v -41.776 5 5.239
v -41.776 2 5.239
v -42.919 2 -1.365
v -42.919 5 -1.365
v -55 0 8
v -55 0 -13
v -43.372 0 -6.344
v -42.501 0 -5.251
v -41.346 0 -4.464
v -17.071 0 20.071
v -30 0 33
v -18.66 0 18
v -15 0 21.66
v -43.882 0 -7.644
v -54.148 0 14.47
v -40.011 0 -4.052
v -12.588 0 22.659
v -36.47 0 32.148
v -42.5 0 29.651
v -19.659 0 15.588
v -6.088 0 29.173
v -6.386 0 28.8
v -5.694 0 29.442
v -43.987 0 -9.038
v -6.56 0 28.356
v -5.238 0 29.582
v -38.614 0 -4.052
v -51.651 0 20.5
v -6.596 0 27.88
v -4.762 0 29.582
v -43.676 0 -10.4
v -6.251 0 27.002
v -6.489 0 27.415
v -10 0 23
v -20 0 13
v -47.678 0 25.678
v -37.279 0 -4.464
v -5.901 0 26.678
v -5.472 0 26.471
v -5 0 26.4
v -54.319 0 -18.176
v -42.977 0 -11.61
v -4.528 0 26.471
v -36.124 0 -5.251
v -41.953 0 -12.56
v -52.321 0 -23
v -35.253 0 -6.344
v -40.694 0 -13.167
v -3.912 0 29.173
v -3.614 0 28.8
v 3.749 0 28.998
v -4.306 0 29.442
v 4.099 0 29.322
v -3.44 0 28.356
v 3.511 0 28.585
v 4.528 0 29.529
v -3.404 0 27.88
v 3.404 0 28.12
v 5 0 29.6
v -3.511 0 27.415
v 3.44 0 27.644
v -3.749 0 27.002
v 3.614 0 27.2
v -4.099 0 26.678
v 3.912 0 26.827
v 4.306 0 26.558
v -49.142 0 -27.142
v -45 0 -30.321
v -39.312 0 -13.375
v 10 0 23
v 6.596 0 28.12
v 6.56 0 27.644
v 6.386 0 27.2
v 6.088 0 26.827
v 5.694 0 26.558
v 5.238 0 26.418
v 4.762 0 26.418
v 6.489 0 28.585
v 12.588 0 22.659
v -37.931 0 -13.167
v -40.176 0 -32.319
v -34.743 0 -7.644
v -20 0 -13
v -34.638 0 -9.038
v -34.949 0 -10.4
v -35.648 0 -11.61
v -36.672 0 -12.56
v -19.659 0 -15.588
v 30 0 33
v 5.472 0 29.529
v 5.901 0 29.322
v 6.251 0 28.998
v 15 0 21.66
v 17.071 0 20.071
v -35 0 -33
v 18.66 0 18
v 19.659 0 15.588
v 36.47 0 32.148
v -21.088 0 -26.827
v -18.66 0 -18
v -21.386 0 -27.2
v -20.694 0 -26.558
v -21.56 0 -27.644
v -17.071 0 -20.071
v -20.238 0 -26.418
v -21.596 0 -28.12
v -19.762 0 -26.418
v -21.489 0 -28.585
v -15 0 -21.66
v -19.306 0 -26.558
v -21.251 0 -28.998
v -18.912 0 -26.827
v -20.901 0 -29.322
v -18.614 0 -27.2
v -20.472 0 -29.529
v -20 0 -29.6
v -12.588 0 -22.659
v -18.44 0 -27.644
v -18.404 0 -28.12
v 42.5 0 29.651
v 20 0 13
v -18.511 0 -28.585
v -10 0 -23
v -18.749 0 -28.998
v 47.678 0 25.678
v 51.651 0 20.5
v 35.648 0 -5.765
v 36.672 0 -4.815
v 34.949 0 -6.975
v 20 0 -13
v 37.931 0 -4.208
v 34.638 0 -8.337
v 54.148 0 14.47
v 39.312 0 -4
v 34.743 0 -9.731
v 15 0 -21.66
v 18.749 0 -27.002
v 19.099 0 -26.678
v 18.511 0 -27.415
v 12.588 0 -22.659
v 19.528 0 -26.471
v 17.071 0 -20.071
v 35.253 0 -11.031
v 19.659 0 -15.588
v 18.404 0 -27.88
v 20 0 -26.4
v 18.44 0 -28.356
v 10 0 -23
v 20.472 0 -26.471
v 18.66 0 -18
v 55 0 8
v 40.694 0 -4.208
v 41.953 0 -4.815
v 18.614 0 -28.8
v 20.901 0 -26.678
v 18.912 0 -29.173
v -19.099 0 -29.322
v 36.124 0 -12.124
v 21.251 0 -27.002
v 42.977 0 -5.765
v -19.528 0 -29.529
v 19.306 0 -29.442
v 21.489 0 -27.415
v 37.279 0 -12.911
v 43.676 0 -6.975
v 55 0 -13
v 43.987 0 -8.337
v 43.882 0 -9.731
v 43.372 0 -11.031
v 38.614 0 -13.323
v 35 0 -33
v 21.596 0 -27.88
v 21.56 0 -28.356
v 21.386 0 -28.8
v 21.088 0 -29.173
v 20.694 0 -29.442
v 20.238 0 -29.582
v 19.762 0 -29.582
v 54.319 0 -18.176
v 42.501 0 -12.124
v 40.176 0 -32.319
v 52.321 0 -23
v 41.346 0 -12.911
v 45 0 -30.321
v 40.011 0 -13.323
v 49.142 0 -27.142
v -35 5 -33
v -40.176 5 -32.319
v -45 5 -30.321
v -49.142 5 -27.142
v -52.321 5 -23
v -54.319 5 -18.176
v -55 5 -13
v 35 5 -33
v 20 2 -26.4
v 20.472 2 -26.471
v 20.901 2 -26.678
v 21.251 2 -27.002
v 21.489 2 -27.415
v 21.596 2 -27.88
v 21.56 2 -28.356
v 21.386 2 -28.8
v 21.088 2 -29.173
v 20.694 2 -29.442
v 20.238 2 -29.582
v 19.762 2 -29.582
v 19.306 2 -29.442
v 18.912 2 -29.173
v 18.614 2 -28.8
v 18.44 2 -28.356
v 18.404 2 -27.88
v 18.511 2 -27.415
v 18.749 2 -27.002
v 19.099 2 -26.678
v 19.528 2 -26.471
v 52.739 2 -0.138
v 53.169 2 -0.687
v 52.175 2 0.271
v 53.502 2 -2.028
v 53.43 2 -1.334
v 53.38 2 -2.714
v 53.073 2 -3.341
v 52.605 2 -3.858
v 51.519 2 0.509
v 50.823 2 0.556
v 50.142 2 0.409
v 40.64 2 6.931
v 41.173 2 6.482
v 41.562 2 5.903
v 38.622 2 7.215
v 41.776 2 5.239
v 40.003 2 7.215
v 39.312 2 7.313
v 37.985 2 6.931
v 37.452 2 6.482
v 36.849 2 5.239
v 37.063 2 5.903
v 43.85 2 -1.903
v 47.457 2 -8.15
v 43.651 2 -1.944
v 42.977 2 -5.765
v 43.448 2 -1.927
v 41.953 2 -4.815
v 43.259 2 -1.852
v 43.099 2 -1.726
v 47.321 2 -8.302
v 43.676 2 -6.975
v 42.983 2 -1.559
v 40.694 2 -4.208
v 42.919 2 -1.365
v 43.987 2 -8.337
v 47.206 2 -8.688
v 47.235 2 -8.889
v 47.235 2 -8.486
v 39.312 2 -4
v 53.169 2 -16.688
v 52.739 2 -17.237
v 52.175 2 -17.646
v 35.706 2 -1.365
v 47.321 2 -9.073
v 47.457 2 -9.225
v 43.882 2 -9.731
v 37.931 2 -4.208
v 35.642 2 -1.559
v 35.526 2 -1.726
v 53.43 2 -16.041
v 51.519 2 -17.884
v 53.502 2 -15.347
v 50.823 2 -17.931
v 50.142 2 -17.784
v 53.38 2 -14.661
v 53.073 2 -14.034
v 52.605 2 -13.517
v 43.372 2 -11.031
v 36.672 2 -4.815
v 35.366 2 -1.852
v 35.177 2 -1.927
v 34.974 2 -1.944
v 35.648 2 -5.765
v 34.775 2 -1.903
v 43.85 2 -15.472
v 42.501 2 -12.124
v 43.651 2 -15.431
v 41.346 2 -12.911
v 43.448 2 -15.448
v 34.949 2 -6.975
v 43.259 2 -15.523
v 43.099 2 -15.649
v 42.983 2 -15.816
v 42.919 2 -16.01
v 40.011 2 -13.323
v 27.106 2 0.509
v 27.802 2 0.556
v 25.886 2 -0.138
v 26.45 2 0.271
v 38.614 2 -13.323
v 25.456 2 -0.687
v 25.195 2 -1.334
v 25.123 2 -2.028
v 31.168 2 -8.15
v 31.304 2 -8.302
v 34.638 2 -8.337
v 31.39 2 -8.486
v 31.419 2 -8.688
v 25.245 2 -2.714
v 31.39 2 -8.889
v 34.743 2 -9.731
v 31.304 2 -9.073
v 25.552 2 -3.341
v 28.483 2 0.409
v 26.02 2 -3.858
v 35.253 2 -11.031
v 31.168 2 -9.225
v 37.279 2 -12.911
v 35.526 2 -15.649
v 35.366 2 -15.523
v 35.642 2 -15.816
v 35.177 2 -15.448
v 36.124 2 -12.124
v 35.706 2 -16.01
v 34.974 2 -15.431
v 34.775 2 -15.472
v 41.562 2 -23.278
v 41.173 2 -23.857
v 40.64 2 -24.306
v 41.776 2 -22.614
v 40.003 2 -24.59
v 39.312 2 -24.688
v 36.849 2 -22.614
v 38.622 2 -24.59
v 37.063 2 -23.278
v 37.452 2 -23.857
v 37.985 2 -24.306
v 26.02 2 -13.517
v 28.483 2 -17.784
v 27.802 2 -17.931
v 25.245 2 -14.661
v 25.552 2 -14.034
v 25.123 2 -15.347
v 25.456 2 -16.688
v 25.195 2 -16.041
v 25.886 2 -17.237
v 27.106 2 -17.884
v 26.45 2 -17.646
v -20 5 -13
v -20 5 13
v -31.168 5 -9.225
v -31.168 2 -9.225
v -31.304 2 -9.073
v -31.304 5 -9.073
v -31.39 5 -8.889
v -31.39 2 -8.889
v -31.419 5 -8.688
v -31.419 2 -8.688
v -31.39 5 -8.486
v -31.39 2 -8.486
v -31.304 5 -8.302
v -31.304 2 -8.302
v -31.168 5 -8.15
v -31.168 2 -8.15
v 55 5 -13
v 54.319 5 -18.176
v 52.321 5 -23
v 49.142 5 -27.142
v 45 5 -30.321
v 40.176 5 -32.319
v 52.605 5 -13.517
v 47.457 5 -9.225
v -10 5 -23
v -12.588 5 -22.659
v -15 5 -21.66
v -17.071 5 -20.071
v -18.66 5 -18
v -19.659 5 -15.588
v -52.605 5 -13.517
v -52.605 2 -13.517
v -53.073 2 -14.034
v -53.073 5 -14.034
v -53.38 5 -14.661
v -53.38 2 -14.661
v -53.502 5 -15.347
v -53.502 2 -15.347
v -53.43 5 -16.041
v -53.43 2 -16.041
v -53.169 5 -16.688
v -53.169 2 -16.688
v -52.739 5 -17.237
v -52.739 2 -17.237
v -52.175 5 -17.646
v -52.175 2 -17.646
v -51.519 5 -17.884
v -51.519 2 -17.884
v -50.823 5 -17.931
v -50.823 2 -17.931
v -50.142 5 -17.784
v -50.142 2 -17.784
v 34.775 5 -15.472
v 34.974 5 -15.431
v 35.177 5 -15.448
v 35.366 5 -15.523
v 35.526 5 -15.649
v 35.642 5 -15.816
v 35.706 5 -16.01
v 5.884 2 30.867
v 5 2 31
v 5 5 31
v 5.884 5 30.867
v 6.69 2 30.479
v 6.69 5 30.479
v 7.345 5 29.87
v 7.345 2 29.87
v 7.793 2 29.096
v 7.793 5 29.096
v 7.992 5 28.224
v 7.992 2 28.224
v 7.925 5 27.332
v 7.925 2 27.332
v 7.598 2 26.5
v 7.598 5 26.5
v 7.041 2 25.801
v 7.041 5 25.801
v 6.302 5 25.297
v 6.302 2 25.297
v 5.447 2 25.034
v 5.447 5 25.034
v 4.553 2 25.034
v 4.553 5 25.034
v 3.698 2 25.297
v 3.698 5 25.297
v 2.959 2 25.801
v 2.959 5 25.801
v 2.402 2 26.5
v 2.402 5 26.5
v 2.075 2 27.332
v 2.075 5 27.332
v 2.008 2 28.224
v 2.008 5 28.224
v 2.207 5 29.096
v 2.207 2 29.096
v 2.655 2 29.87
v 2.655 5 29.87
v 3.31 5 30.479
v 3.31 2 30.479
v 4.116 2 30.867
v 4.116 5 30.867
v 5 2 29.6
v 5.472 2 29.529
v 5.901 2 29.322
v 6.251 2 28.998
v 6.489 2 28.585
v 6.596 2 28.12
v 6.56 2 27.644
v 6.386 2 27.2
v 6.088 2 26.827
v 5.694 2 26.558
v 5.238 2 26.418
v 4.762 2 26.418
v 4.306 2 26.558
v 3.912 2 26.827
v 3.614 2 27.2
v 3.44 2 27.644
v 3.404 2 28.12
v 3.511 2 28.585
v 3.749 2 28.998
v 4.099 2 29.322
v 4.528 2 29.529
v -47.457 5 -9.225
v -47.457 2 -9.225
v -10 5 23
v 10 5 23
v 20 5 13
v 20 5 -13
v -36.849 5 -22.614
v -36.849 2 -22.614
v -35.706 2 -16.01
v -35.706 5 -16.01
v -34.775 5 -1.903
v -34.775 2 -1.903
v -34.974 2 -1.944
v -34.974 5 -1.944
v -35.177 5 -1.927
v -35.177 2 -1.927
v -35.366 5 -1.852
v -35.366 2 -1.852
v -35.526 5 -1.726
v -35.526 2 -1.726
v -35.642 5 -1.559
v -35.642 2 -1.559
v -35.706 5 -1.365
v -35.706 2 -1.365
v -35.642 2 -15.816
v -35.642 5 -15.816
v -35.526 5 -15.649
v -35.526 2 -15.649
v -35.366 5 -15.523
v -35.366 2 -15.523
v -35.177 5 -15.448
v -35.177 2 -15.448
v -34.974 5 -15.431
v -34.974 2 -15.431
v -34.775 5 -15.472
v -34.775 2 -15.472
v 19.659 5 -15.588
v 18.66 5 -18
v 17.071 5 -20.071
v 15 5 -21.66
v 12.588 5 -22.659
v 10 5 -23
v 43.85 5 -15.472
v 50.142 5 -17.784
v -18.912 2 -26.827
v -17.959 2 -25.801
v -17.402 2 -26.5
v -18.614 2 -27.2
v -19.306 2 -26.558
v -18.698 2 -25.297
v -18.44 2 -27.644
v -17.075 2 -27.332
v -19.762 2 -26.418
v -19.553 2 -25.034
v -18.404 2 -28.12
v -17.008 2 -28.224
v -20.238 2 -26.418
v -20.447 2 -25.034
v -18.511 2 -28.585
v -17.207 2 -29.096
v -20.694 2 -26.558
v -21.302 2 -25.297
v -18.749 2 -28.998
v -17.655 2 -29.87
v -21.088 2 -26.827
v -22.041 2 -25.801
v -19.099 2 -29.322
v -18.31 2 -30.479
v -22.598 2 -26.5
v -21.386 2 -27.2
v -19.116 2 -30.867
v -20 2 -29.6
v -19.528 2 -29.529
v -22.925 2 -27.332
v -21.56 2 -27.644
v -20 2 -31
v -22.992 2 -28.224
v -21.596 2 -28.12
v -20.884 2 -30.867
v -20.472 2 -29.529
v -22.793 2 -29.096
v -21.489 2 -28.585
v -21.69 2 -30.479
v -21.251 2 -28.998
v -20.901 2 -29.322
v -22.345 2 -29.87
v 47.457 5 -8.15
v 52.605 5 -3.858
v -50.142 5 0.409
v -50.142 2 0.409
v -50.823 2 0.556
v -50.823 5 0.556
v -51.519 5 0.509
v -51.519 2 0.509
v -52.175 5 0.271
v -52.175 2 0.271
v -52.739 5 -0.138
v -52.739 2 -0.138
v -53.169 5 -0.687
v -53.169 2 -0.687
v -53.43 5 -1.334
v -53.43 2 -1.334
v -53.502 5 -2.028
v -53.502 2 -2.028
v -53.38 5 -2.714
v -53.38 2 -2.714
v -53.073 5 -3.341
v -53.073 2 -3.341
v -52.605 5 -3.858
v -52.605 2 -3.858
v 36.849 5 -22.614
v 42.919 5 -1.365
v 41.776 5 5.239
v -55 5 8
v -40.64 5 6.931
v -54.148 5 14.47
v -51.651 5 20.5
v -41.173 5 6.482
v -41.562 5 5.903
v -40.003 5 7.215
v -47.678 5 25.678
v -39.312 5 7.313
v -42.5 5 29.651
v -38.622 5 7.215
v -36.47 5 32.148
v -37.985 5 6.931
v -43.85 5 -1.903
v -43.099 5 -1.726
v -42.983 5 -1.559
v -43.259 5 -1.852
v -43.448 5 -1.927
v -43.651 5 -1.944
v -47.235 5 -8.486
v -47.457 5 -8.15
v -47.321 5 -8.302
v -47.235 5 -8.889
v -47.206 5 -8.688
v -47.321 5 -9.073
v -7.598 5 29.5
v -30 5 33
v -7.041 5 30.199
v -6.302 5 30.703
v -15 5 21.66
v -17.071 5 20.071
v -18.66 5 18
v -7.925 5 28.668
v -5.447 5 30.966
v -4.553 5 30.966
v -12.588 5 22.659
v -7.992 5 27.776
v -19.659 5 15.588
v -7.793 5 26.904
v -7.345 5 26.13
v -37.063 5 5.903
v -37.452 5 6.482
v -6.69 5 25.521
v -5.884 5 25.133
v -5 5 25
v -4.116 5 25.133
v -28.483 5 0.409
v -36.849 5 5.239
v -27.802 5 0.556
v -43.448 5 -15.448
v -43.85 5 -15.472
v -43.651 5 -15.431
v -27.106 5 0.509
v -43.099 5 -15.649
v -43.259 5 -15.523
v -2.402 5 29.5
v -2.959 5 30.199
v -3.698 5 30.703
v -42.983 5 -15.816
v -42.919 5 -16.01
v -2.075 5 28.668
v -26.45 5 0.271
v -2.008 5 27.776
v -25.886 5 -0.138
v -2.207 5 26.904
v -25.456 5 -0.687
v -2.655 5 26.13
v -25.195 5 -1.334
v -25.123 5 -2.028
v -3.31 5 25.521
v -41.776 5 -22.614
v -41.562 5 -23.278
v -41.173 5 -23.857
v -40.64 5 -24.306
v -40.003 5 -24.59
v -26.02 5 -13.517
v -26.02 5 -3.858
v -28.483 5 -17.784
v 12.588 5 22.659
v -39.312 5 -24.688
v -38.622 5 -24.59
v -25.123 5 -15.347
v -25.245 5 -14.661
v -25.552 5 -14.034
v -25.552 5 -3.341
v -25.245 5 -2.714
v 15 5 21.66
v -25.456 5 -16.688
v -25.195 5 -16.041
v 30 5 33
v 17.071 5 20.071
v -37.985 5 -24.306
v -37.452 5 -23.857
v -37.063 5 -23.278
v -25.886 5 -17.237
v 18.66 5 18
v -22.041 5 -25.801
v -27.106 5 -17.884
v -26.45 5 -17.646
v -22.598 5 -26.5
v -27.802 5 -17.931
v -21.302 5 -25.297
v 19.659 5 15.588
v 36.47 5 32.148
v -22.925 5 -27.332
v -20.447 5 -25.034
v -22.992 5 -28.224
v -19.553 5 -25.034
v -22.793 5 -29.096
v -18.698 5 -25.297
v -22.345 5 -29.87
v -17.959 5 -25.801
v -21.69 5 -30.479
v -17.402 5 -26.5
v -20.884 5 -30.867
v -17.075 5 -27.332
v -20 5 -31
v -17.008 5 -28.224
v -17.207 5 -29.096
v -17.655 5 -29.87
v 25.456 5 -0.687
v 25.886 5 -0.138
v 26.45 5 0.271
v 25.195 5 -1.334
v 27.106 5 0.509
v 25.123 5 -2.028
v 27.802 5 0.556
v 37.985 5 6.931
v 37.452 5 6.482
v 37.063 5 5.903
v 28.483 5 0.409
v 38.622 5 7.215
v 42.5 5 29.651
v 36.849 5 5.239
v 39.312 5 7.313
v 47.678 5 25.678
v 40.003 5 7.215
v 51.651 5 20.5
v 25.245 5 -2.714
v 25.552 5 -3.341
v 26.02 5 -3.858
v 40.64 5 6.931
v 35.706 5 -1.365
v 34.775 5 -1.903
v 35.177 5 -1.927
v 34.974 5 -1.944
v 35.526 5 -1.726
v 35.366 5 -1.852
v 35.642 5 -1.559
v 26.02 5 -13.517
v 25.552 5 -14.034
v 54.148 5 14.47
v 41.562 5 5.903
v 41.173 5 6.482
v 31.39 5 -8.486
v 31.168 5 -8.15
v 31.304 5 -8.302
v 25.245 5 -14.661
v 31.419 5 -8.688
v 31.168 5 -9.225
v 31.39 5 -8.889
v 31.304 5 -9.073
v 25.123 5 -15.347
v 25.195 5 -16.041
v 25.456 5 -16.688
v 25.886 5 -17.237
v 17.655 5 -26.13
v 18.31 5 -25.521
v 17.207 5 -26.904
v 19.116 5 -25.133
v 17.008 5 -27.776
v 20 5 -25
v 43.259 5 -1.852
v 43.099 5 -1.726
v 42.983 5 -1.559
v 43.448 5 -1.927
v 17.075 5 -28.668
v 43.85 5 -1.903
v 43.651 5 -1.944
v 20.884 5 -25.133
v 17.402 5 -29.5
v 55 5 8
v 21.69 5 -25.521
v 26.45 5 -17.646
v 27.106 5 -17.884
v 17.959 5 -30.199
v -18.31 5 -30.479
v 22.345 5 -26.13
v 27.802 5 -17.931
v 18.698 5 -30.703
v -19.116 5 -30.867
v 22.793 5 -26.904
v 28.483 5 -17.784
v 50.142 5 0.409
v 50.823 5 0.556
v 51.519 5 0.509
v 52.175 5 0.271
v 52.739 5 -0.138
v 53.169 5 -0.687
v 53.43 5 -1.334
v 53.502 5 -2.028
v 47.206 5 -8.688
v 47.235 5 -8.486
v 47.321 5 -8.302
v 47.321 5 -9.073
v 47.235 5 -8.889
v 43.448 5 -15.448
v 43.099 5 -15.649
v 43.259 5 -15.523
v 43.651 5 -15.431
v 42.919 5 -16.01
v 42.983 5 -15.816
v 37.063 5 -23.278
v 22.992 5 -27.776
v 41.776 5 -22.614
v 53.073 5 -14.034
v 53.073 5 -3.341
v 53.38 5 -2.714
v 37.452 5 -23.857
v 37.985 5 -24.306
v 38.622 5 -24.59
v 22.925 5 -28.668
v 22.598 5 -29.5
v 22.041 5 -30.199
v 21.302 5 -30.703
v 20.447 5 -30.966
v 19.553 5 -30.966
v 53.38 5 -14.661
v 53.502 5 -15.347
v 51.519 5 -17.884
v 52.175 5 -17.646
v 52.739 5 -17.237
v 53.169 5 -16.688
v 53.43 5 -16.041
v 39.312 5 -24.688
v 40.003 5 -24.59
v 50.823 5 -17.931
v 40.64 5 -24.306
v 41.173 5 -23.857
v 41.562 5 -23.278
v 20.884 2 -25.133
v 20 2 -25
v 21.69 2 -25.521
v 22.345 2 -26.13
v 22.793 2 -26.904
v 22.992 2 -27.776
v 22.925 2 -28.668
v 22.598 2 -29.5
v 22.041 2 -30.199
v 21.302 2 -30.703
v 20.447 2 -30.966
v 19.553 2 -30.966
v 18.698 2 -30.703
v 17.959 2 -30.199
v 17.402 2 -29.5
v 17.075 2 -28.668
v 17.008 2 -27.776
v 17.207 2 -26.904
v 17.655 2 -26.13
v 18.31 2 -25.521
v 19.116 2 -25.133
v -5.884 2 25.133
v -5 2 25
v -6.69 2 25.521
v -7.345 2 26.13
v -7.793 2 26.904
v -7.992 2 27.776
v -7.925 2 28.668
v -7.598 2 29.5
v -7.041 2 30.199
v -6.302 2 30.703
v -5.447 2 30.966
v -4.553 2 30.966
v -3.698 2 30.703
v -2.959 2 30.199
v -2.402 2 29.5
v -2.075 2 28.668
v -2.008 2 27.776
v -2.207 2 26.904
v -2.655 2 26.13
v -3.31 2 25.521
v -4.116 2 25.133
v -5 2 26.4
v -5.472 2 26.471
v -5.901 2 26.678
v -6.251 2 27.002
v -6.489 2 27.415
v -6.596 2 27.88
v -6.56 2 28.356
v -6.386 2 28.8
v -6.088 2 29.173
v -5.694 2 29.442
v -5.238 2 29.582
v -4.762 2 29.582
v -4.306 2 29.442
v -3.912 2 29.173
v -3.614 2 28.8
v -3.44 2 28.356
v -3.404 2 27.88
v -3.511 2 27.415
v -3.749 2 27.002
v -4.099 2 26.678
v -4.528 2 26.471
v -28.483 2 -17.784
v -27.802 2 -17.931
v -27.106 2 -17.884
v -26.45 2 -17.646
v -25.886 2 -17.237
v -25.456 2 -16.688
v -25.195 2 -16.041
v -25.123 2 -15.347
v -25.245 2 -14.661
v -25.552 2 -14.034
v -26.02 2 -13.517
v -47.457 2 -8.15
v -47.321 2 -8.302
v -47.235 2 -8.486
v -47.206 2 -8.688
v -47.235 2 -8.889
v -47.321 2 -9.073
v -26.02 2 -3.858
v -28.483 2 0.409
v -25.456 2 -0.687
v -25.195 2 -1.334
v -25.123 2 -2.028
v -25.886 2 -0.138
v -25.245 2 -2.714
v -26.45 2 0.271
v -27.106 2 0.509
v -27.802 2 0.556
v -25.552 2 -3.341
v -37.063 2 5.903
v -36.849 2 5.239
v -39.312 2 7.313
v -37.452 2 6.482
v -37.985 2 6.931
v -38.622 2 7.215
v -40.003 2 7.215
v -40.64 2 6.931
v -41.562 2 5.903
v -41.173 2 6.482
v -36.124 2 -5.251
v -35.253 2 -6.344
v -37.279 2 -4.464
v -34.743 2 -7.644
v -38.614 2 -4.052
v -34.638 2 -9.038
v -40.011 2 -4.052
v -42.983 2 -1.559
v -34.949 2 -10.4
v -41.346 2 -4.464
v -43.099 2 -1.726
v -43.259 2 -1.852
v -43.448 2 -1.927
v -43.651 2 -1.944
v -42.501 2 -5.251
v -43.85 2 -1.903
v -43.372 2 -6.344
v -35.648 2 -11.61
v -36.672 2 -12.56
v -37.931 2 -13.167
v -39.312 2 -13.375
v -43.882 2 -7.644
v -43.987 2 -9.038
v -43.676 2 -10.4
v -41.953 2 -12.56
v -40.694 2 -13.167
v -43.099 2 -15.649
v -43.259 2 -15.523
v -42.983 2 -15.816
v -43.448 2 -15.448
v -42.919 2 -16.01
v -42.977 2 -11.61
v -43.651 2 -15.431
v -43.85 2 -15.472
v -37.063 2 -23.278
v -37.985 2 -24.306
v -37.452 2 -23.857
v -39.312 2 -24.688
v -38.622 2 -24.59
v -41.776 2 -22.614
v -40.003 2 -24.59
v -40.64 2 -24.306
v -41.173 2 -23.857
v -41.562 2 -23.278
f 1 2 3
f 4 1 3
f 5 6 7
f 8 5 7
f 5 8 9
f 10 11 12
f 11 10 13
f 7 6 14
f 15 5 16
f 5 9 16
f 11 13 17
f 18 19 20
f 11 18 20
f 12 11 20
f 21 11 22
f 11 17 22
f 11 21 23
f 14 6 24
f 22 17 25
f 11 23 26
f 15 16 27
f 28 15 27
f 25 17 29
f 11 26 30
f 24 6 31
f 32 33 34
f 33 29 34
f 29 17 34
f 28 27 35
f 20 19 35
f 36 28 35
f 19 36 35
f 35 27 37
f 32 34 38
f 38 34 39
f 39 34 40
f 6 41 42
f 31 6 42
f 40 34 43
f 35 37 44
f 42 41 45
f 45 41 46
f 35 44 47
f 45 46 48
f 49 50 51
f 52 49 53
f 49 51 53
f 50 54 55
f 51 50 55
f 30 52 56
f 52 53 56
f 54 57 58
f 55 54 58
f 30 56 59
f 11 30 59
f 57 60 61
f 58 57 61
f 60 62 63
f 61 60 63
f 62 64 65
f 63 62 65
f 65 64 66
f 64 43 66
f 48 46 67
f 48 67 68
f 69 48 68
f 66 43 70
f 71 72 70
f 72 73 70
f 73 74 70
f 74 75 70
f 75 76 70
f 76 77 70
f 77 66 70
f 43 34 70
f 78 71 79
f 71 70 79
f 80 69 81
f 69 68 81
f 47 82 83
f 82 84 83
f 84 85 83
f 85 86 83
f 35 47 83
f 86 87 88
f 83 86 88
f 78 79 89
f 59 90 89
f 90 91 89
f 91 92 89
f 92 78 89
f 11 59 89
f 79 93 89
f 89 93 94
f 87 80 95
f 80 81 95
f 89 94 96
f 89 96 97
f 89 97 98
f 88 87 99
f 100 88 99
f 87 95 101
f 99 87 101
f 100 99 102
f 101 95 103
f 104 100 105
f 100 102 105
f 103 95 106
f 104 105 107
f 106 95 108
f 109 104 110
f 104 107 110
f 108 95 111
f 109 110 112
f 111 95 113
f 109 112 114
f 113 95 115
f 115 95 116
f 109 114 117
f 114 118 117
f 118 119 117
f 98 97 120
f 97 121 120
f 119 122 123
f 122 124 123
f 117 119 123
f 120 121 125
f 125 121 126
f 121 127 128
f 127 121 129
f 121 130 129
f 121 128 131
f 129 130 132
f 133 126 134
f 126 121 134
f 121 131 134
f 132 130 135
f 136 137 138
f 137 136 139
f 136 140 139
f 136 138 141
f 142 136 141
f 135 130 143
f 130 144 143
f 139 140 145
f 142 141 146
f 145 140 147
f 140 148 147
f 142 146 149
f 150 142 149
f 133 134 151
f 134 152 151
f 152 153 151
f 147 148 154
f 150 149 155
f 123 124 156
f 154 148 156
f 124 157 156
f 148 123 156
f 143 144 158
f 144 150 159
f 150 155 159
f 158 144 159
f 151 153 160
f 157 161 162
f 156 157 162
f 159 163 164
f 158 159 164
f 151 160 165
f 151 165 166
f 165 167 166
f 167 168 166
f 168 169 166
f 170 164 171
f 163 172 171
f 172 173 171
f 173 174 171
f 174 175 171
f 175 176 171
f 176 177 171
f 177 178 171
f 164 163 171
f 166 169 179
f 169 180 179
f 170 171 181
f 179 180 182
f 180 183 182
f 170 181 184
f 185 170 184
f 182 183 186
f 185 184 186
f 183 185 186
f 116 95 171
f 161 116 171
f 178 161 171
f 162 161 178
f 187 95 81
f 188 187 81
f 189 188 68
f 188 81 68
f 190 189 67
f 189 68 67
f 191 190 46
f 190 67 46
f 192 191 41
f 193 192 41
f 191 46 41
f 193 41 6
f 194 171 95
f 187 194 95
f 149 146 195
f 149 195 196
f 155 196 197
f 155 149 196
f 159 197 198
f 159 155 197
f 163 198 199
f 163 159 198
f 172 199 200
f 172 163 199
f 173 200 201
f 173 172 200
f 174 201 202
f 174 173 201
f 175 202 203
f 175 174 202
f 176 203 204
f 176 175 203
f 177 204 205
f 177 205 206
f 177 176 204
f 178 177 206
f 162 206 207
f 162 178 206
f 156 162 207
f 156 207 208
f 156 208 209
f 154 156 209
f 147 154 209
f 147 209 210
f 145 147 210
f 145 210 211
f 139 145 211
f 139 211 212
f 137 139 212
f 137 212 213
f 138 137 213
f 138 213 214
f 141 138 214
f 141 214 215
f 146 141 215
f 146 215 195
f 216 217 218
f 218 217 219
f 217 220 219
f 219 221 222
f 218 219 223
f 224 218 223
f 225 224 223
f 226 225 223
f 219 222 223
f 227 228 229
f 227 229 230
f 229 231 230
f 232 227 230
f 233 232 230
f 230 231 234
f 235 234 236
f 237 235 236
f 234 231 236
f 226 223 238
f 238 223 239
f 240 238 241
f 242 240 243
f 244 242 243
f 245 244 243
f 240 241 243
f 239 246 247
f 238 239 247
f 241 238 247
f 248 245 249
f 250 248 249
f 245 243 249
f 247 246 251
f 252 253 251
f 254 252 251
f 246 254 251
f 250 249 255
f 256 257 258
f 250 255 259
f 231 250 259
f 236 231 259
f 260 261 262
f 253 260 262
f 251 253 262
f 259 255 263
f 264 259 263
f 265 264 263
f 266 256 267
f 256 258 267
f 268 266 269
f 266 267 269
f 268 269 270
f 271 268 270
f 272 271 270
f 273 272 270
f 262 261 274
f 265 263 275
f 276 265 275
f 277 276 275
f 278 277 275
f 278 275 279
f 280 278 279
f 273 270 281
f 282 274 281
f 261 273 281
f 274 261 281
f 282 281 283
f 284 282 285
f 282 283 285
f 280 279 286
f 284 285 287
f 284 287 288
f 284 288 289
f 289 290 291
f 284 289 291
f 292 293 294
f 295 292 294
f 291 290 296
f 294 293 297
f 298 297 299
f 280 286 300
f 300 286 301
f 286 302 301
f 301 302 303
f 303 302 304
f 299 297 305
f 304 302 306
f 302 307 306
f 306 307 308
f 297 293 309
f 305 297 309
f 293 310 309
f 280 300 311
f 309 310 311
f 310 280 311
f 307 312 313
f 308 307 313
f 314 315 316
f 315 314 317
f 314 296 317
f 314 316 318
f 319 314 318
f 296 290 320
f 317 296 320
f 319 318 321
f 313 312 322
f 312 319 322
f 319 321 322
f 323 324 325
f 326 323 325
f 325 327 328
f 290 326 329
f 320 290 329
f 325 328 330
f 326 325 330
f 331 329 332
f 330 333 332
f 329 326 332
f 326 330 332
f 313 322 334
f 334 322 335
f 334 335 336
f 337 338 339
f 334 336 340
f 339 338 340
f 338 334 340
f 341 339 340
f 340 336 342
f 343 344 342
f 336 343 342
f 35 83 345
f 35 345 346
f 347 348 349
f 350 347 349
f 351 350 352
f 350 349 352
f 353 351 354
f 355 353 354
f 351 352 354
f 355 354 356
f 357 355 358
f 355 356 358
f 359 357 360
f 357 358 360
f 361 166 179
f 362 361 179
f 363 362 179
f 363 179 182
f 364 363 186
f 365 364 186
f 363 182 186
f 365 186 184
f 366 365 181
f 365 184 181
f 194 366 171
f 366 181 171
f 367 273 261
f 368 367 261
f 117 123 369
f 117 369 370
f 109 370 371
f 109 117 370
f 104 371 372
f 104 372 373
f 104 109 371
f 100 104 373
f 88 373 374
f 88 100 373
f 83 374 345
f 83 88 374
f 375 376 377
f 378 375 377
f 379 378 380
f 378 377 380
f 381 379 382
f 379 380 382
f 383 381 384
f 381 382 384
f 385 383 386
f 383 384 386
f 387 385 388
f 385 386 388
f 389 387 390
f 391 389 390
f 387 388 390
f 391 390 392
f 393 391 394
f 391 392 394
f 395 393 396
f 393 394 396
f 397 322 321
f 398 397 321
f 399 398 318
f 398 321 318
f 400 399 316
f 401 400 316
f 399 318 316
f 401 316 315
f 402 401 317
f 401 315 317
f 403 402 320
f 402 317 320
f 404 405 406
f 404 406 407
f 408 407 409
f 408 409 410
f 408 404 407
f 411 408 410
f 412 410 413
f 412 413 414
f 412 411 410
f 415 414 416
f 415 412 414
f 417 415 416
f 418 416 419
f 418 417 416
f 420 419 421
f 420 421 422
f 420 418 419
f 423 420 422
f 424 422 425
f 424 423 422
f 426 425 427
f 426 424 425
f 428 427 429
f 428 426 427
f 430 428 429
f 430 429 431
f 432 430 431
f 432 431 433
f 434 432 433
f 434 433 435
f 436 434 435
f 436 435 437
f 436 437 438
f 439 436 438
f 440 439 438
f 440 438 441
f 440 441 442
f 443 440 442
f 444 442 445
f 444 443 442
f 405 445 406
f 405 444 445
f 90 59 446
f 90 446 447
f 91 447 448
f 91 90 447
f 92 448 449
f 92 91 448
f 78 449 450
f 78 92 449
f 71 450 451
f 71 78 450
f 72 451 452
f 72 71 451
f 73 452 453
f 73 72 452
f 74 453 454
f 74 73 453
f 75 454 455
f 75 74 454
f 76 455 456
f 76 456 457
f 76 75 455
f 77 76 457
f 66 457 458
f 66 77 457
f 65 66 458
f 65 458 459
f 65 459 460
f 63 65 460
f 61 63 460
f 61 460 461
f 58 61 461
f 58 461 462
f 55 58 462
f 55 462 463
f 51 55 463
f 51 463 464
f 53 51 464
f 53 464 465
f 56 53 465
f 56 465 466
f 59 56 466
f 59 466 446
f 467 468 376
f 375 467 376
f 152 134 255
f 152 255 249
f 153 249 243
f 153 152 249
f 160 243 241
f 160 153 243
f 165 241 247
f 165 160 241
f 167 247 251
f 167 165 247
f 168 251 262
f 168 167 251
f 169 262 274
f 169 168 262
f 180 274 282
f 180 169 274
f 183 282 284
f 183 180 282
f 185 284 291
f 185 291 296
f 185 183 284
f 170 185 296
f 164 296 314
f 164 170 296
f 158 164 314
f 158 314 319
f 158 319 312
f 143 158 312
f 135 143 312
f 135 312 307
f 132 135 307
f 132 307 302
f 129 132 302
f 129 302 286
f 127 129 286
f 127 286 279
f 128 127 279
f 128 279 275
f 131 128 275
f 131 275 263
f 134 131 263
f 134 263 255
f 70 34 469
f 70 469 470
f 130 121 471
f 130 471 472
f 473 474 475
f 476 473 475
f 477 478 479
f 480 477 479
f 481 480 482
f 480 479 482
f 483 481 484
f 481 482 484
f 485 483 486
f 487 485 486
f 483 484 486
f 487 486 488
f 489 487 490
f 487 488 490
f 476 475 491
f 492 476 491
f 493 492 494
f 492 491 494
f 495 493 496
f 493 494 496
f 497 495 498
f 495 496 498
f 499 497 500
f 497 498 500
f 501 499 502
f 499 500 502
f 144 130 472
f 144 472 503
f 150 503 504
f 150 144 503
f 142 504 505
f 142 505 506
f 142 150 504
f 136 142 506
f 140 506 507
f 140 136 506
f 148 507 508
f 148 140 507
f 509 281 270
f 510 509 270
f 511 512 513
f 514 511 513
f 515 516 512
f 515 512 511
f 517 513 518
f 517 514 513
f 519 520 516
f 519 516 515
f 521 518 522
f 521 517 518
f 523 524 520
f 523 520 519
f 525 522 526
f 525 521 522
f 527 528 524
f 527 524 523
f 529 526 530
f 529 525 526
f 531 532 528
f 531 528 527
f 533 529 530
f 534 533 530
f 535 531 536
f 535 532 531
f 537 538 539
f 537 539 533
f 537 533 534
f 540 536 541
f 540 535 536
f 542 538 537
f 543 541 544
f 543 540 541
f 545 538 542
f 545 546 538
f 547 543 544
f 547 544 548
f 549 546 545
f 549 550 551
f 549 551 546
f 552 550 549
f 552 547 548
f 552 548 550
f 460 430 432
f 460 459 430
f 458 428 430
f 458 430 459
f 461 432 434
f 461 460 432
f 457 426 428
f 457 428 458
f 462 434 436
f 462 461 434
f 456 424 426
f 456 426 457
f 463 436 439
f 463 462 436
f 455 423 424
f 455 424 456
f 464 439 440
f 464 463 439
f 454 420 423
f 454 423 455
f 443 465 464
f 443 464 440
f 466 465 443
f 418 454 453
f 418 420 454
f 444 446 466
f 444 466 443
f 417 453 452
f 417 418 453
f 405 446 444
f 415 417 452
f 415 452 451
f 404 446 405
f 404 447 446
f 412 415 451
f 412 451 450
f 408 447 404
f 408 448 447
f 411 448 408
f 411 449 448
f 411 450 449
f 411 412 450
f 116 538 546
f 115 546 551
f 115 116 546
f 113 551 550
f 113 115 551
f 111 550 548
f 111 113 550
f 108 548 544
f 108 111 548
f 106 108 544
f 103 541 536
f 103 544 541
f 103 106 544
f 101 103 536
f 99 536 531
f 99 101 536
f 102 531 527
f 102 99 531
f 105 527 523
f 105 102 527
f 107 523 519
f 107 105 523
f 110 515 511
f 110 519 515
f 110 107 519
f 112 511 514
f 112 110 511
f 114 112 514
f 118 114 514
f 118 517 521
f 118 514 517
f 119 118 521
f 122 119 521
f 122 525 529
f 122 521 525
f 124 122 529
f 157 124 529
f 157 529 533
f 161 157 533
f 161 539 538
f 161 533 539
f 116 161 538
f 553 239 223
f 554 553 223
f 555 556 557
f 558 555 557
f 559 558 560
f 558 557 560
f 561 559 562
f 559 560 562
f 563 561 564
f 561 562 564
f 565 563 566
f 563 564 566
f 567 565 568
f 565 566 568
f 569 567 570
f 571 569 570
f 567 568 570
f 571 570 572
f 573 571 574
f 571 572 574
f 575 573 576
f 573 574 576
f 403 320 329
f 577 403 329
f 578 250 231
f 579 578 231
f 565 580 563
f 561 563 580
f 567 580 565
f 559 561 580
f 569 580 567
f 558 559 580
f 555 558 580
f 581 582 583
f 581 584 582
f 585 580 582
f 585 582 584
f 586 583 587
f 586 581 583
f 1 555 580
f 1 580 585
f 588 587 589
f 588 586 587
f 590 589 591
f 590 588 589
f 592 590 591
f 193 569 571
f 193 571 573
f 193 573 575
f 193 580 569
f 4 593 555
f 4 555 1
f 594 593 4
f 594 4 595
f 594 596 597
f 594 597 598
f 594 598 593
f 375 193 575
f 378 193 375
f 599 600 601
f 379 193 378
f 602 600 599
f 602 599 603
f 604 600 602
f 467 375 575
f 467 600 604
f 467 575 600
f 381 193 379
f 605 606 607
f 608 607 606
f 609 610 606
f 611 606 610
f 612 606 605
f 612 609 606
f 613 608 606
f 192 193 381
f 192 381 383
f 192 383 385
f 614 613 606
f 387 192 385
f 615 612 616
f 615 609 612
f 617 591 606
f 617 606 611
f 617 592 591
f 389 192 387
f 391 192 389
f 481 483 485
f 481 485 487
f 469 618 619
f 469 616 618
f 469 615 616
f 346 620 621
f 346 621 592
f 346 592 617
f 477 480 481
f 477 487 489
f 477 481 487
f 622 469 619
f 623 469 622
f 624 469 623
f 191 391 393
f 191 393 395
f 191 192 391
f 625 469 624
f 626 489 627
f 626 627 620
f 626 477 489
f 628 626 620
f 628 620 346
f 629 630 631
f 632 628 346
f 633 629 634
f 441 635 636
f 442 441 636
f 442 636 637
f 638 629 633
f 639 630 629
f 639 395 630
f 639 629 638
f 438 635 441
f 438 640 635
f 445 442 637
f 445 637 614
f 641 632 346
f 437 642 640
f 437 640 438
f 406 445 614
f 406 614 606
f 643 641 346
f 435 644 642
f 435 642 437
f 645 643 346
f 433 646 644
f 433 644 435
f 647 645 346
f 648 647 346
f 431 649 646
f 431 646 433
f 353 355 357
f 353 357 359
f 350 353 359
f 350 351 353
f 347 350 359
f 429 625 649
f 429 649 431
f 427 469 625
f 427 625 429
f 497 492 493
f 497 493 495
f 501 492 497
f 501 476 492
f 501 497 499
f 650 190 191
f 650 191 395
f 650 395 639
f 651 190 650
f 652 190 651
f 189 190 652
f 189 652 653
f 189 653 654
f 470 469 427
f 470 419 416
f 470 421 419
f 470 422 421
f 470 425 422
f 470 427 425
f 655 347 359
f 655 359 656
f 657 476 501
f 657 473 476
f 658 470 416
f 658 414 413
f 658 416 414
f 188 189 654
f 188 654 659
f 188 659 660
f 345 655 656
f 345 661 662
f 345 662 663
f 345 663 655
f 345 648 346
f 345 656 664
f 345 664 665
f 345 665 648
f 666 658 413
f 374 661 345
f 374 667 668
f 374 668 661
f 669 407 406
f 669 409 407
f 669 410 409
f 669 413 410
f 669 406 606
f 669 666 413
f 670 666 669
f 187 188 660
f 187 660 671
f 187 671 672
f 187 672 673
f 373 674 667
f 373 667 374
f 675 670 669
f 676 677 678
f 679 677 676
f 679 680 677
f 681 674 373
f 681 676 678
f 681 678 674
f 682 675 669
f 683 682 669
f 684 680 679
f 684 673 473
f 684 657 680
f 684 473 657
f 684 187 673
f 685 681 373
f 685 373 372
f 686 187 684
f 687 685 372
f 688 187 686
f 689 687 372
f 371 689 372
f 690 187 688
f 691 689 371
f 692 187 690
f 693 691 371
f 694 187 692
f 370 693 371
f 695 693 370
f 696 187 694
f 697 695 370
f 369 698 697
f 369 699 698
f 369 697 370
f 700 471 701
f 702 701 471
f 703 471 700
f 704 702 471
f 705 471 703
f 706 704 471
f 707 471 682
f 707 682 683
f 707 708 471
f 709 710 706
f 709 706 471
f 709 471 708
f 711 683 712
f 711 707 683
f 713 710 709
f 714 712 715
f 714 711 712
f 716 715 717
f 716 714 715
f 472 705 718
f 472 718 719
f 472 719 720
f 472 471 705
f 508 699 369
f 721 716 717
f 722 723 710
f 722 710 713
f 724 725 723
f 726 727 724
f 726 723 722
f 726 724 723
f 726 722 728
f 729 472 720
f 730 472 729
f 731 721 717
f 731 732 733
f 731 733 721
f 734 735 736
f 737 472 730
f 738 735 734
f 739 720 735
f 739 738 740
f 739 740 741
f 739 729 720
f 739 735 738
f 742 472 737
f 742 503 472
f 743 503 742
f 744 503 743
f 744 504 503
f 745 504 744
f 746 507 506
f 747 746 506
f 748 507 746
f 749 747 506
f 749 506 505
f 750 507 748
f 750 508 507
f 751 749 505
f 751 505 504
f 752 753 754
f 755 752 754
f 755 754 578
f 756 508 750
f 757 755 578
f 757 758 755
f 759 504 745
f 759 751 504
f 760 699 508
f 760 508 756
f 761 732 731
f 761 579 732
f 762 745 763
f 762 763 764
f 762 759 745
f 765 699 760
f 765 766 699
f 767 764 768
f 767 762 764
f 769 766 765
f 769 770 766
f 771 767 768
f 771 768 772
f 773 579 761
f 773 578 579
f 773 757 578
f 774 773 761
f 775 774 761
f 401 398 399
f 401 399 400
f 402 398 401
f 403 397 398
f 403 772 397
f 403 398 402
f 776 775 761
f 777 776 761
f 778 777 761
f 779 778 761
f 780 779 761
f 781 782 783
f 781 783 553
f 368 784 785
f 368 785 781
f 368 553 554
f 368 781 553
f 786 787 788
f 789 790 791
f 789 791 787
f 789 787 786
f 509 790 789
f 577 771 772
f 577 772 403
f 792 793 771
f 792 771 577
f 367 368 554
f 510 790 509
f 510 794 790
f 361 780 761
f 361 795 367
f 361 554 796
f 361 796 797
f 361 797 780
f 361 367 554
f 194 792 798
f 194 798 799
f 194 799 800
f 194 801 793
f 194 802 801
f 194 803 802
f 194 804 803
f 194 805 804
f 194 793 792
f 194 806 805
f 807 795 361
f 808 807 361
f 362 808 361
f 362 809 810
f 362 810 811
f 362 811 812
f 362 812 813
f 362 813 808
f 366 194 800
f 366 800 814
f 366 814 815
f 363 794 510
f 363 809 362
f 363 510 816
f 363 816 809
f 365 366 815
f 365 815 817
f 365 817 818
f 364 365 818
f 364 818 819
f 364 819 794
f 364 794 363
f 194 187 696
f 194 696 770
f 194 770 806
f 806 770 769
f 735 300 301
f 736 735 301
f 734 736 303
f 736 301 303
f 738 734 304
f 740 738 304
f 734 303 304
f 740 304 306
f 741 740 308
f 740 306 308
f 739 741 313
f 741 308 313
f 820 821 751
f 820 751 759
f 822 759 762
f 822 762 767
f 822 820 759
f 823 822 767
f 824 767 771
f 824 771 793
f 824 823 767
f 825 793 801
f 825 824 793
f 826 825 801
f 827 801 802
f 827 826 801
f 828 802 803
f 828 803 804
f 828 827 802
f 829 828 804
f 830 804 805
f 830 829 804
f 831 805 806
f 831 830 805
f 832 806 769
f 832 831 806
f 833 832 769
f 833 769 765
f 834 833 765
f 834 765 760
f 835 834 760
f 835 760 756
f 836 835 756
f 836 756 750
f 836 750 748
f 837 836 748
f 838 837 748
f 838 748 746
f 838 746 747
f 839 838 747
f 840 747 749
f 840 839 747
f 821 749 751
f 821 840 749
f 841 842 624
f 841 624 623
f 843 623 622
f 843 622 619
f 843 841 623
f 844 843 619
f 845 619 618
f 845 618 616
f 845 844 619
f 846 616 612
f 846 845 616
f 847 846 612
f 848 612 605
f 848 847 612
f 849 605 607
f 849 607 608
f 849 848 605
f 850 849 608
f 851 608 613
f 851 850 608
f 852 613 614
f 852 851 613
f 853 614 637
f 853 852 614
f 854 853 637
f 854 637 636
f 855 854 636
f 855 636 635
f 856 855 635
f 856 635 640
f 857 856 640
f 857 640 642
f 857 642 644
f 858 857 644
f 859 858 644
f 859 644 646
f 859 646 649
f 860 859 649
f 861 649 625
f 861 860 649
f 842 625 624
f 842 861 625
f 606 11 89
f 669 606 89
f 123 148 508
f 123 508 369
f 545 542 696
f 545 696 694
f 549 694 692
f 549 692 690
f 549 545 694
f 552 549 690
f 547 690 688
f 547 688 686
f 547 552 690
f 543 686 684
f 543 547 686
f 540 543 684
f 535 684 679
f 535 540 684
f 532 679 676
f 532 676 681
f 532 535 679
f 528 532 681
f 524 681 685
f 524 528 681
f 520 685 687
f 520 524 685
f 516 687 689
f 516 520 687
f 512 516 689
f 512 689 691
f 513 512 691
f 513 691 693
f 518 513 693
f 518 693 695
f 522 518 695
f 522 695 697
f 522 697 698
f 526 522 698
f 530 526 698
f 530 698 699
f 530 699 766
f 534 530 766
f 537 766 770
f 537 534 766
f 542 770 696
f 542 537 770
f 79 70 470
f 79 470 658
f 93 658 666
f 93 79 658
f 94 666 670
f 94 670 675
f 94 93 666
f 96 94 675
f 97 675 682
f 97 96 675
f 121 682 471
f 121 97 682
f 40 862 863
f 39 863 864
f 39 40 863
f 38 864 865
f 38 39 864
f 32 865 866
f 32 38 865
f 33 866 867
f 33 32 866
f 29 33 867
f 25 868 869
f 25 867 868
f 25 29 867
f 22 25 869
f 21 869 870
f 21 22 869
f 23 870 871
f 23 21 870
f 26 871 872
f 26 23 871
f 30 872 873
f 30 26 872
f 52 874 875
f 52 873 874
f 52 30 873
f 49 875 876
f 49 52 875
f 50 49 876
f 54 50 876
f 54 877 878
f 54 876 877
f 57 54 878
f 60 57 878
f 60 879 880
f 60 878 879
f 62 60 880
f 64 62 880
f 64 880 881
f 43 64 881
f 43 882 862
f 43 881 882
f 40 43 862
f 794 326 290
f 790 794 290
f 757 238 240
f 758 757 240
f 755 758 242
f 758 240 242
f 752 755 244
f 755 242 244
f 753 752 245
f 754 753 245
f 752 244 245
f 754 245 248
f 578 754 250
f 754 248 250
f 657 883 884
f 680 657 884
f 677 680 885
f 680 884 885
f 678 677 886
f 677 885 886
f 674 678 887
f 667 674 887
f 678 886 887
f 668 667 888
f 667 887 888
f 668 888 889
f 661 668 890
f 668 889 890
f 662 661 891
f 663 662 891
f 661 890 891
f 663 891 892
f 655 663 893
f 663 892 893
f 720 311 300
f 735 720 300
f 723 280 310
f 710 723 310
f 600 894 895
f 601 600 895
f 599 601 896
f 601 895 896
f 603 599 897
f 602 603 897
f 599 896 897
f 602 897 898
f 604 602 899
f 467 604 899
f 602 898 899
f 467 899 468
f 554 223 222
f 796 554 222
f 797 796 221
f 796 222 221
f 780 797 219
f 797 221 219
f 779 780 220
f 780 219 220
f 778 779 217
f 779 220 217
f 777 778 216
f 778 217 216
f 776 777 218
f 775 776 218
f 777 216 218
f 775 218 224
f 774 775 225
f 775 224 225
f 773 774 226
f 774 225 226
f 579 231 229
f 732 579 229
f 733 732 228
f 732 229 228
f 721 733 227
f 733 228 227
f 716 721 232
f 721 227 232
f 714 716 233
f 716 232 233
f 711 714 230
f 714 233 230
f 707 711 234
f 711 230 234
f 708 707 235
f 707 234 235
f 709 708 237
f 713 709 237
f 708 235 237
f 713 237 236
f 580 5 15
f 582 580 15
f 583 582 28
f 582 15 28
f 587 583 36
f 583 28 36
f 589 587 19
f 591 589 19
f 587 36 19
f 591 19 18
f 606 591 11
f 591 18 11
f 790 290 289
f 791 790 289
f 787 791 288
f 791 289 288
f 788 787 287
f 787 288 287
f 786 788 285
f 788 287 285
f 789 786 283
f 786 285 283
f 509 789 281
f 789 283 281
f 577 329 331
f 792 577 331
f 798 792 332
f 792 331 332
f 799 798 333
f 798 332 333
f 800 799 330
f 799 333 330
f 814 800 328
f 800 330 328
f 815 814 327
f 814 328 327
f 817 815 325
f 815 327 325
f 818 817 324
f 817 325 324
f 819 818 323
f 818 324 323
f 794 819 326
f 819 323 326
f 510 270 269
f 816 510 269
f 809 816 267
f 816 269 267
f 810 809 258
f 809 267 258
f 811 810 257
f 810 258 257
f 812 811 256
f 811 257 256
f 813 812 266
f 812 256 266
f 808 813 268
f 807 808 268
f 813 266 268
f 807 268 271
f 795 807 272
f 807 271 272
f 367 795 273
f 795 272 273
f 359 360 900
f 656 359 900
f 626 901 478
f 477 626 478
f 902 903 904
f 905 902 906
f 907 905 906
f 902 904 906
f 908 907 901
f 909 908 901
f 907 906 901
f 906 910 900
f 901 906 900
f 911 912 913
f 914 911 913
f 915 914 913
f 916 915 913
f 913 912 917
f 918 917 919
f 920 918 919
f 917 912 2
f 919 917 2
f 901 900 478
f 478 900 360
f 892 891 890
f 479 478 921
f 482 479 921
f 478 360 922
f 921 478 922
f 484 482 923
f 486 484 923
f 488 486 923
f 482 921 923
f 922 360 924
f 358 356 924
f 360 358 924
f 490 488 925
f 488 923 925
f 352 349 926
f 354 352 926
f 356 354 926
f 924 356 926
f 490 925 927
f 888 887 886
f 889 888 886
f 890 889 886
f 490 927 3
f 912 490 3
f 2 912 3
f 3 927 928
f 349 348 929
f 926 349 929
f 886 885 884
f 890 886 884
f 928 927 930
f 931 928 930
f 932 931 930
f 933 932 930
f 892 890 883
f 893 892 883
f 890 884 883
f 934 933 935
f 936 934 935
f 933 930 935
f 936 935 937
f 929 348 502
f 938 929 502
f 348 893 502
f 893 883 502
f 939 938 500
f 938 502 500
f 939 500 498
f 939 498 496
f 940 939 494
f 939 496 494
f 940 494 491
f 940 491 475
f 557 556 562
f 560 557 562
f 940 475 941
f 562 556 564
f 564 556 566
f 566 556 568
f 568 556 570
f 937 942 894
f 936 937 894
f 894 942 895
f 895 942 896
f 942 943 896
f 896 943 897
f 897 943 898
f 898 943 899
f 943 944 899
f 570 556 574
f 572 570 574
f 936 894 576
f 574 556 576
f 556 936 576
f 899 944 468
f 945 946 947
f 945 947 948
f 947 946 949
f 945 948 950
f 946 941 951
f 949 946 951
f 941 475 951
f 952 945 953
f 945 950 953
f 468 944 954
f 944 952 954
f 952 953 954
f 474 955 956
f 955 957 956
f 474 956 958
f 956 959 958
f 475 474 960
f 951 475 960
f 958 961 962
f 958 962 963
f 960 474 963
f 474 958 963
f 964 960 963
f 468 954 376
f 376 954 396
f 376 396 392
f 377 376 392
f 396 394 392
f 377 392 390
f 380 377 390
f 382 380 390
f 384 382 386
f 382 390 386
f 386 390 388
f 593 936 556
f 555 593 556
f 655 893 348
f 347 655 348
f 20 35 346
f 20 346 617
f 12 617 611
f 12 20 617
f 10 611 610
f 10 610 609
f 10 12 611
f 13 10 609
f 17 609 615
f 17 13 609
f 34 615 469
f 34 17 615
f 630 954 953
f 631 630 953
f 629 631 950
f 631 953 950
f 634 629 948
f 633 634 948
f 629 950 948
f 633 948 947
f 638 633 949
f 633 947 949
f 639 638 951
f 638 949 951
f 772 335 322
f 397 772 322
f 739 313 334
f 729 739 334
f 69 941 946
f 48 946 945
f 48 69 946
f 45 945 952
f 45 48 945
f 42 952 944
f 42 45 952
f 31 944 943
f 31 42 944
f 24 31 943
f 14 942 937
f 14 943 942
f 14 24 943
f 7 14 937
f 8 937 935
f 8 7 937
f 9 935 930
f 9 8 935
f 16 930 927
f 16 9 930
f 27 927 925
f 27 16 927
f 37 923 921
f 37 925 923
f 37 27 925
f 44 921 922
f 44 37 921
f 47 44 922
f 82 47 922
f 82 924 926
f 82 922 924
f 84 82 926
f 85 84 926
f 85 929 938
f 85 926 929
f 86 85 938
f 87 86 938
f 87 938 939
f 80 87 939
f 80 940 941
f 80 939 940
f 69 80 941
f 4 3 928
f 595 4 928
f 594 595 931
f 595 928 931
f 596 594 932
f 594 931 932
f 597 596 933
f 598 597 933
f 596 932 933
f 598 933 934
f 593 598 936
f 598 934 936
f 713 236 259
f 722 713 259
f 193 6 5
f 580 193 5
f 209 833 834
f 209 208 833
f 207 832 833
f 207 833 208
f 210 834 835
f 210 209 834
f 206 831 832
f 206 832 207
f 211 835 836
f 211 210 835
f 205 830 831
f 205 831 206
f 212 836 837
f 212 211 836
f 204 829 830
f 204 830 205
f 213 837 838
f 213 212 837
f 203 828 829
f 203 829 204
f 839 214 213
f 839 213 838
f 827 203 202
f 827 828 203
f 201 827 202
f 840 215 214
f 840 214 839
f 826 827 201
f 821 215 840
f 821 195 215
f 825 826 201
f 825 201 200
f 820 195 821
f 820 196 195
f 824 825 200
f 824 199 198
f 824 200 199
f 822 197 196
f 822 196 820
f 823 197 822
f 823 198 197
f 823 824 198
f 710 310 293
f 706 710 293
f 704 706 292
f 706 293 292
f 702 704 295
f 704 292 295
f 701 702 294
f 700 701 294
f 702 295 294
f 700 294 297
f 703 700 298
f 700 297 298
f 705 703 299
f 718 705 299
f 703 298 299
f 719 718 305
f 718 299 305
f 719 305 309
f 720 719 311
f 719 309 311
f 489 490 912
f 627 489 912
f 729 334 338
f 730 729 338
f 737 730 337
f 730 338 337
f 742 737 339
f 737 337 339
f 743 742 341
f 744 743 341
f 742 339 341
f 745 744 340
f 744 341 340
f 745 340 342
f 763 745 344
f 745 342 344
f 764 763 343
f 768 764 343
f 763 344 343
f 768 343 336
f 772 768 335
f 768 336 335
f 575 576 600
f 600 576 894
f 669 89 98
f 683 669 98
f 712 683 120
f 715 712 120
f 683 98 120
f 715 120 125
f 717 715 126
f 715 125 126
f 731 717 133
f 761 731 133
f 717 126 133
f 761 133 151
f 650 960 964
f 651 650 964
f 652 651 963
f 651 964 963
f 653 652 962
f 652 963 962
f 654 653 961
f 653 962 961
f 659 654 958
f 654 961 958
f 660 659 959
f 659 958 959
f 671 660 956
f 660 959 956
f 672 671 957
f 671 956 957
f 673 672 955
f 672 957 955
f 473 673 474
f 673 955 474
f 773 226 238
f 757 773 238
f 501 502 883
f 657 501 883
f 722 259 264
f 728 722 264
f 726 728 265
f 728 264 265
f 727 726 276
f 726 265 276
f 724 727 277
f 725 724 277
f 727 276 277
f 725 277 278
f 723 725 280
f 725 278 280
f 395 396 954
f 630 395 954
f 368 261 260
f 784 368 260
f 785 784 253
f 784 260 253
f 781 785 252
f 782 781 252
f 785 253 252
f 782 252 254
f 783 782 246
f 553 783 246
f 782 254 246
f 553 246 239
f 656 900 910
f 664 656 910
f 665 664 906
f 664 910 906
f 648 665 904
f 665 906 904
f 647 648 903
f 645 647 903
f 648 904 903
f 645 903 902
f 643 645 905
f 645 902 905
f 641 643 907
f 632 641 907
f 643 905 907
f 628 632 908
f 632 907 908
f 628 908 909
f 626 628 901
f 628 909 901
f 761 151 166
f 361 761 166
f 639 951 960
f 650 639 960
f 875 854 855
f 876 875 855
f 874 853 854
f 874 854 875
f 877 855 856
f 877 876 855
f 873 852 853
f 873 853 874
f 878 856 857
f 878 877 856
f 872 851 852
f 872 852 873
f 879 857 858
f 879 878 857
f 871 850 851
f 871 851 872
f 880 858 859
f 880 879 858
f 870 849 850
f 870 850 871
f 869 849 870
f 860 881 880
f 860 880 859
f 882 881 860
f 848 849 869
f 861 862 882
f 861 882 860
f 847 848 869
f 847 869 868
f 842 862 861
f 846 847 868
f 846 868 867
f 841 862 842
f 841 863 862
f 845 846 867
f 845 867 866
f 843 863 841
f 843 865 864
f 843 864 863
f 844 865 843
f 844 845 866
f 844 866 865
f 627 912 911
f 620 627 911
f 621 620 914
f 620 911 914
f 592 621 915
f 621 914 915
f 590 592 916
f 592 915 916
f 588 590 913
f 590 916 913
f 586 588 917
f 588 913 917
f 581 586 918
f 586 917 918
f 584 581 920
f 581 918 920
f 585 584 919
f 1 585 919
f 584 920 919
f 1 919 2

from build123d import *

# Parameters (mm, degrees)
CROQUIS1_R              = 1.6
CROQUIS1_R_2            = 4.6875
SALIENTE_EXTRUIR1_DEPTH = 5
CORTAR_EXTRUIR1_START   = -3
CROQUIS2_R              = 3
CROQUIS2_R_2            = 1.6
CROQUIS2_R_3            = 4.6875
CORTAR_EXTRUIR1_DEPTH   = 3


with BuildPart() as part:
    # Croquis1 → Saliente-Extruir1 (new body)
    with BuildSketch(Plane(origin=(0, 0, 0), x_dir=(1, 0, 0), z_dir=(0, 1, 0))):
        with BuildLine():
            Line((-30, -33), (30, -33))
            ThreePointArc((30, -33), (47.67766953, -25.67766953), (55, -8))
            Line((55, -8), (55, 13))
            ThreePointArc((55, 13), (49.142135624, 27.142135624), (35, 33))
            Line((35, 33), (-35, 33))
            ThreePointArc((-35, 33), (-49.142135624, 27.142135624), (-55, 13))
            Line((-55, 13), (-55, -8))
            ThreePointArc((-55, -8), (-47.67766953, -25.67766953), (-30, -33))
        make_face()
        with Locations(Location((5, -28, 0), (0, 0, 270))):
            Circle(CROQUIS1_R, mode=Mode.SUBTRACT)
        with Locations(Location((20, 28, 0), (0, 0, 270))):
            Circle(CROQUIS1_R, mode=Mode.SUBTRACT)
        with Locations(Location((39.3125, 8.6875, 0), (0, 0, 270))):
            Circle(CROQUIS1_R_2, mode=Mode.SUBTRACT)
        with Locations(Location((-5, -28, 0), (0, 0, 90))):
            Circle(CROQUIS1_R, mode=Mode.SUBTRACT)
        with Locations(Location((-39.3125, 8.6875, 0), (0, 0, 90))):
            Circle(CROQUIS1_R_2, mode=Mode.SUBTRACT)
        with Locations(Location((-20, 28, 0), (0, 0, 90))):
            Circle(CROQUIS1_R, mode=Mode.SUBTRACT)
        with BuildLine():
            Line((-10, -23), (10, -23))
            ThreePointArc((10, -23), (17.071067812, -20.071067812), (20, -13))
            Line((20, -13), (20, 13))
            ThreePointArc((20, 13), (17.071067812, 20.071067812), (10, 23))
            Line((10, 23), (-10, 23))
            ThreePointArc((-10, 23), (-17.071067812, 20.071067812), (-20, 13))
            Line((-20, 13), (-20, -13))
            ThreePointArc((-20, -13), (-17.071067812, -20.071067812), (-10, -23))
        make_face(mode=Mode.SUBTRACT)
    extrude(amount=SALIENTE_EXTRUIR1_DEPTH)

    # Croquis2 → Cortar-Extruir1 (cut)
    # profile 1 of 6: a face of its own
    with BuildSketch(Plane(origin=(0, 5, 0), x_dir=(1, 0, 0), z_dir=(0, 1, 0)).offset(CORTAR_EXTRUIR1_START)):
        with Locations(Location((20, 28, 0), (0, 0, 270))):
            Circle(CROQUIS2_R)
        with Locations(Location((20, 28, 0), (0, 0, 270))):
            Circle(CROQUIS2_R_2, mode=Mode.SUBTRACT)
    # profile 2 of 6: a face of its own
    with BuildSketch(Plane(origin=(0, 5, 0), x_dir=(1, 0, 0), z_dir=(0, 1, 0)).offset(CORTAR_EXTRUIR1_START)):
        with Locations(Location((5, -28, 0), (0, 0, 270))):
            Circle(CROQUIS2_R)
        with Locations(Location((5, -28, 0), (0, 0, 270))):
            Circle(CROQUIS2_R_2, mode=Mode.SUBTRACT)
    # profile 3 of 6: a face of its own
    with BuildSketch(Plane(origin=(0, 5, 0), x_dir=(1, 0, 0), z_dir=(0, 1, 0)).offset(CORTAR_EXTRUIR1_START)):
        with Locations(Location((-5, -28, 0), (0, 0, 90))):
            Circle(CROQUIS2_R)
    # profile 4 of 6: a face of its own
    with BuildSketch(Plane(origin=(0, 5, 0), x_dir=(1, 0, 0), z_dir=(0, 1, 0)).offset(CORTAR_EXTRUIR1_START)):
        with Locations(Location((-20, 28, 0), (0, 0, 90))):
            Circle(CROQUIS2_R)
    # profile 5 of 6: a face of its own
    with BuildSketch(Plane(origin=(0, 5, 0), x_dir=(1, 0, 0), z_dir=(0, 1, 0)).offset(CORTAR_EXTRUIR1_START)):
        with BuildLine():
            Line((35.705717307, 16.009871883), (36.849149414, 22.614001921))
            ThreePointArc((36.849149414, 22.614001921), (39.3125, 24.6875), (41.775850586, 22.614001921))
            Line((41.775850586, 22.614001921), (42.919282693, 16.009871883))
            ThreePointArc((42.919282693, 16.009871883), (43.259020857, 15.523074638), (43.85046872, 15.472251379))
            Line((43.85046872, 15.472251379), (50.141529157, 17.784075147))
            ThreePointArc((50.141529157, 17.784075147), (53.168906461, 16.6875), (52.604879743, 13.517426775))
            Line((52.604879743, 13.517426775), (47.457251413, 9.225120503))
            ThreePointArc((47.457251413, 9.225120503), (47.205541715, 8.6875), (47.457251413, 8.149879497))
            Line((47.457251413, 8.149879497), (52.604879743, 3.857573225))
            ThreePointArc((52.604879743, 3.857573225), (53.168906461, 0.6875), (50.141529157, -0.409075147))
            Line((50.141529157, -0.409075147), (43.85046872, 1.902748621))
            ThreePointArc((43.85046872, 1.902748621), (43.259020857, 1.851925362), (42.919282693, 1.365128117))
            Line((42.919282693, 1.365128117), (41.775850586, -5.239001921))
            ThreePointArc((41.775850586, -5.239001921), (39.3125, -7.3125), (36.849149414, -5.239001921))
            Line((36.849149414, -5.239001921), (35.705717307, 1.365128117))
            ThreePointArc((35.705717307, 1.365128117), (35.365979143, 1.851925362), (34.77453128, 1.902748621))
            Line((34.77453128, 1.902748621), (28.483470843, -0.409075147))
            ThreePointArc((28.483470843, -0.409075147), (25.456093539, 0.6875), (26.020120257, 3.857573225))
            Line((26.020120257, 3.857573225), (31.167748587, 8.149879497))
            ThreePointArc((31.167748587, 8.149879497), (31.419458285, 8.6875), (31.167748587, 9.225120503))
            Line((31.167748587, 9.225120503), (26.020120257, 13.517426775))
            ThreePointArc((26.020120257, 13.517426775), (25.456093539, 16.6875), (28.483470843, 17.784075147))
            Line((28.483470843, 17.784075147), (34.77453128, 15.472251379))
            ThreePointArc((34.77453128, 15.472251379), (35.365979143, 15.523074638), (35.705717307, 16.009871883))
        make_face()
        with Locations(Location((39.3125, 8.6875, 0), (0, 0, 270))):
            Circle(CROQUIS2_R_3, mode=Mode.SUBTRACT)
    # profile 6 of 6: a face of its own
    with BuildSketch(Plane(origin=(0, 5, 0), x_dir=(1, 0, 0), z_dir=(0, 1, 0)).offset(CORTAR_EXTRUIR1_START)):
        with BuildLine():
            Line((-34.77453128, 15.472251379), (-28.483470843, 17.784075147))
            ThreePointArc((-28.483470843, 17.784075147), (-25.456093539, 16.6875), (-26.020120257, 13.517426775))
            Line((-26.020120257, 13.517426775), (-31.167748587, 9.225120503))
            ThreePointArc((-31.167748587, 9.225120503), (-31.419458285, 8.6875), (-31.167748587, 8.149879497))
            Line((-31.167748587, 8.149879497), (-26.020120257, 3.857573225))
            ThreePointArc((-26.020120257, 3.857573225), (-25.456093539, 0.6875), (-28.483470843, -0.409075147))
            Line((-28.483470843, -0.409075147), (-34.77453128, 1.902748621))
            ThreePointArc((-34.77453128, 1.902748621), (-35.365979143, 1.851925362), (-35.705717307, 1.365128117))
            Line((-35.705717307, 1.365128117), (-36.849149414, -5.239001921))
            ThreePointArc((-36.849149414, -5.239001921), (-39.3125, -7.3125), (-41.775850586, -5.239001921))
            Line((-41.775850586, -5.239001921), (-42.919282693, 1.365128117))
            ThreePointArc((-42.919282693, 1.365128117), (-43.259020857, 1.851925362), (-43.85046872, 1.902748621))
            Line((-43.85046872, 1.902748621), (-50.141529157, -0.409075147))
            ThreePointArc((-50.141529157, -0.409075147), (-53.168906461, 0.6875), (-52.604879743, 3.857573225))
            Line((-52.604879743, 3.857573225), (-47.457251413, 8.149879497))
            ThreePointArc((-47.457251413, 8.149879497), (-47.205541715, 8.6875), (-47.457251413, 9.225120503))
            Line((-47.457251413, 9.225120503), (-52.604879743, 13.517426775))
            ThreePointArc((-52.604879743, 13.517426775), (-53.168906461, 16.6875), (-50.141529157, 17.784075147))
            Line((-50.141529157, 17.784075147), (-43.85046872, 15.472251379))
            ThreePointArc((-43.85046872, 15.472251379), (-43.259020857, 15.523074638), (-42.919282693, 16.009871883))
            Line((-42.919282693, 16.009871883), (-41.775850586, 22.614001921))
            ThreePointArc((-41.775850586, 22.614001921), (-39.3125, 24.6875), (-36.849149414, 22.614001921))
            Line((-36.849149414, 22.614001921), (-35.705717307, 16.009871883))
            ThreePointArc((-35.705717307, 16.009871883), (-35.365979143, 15.523074638), (-34.77453128, 15.472251379))
        make_face()
    extrude(amount=CORTAR_EXTRUIR1_DEPTH, mode=Mode.SUBTRACT)


solid = part.part
